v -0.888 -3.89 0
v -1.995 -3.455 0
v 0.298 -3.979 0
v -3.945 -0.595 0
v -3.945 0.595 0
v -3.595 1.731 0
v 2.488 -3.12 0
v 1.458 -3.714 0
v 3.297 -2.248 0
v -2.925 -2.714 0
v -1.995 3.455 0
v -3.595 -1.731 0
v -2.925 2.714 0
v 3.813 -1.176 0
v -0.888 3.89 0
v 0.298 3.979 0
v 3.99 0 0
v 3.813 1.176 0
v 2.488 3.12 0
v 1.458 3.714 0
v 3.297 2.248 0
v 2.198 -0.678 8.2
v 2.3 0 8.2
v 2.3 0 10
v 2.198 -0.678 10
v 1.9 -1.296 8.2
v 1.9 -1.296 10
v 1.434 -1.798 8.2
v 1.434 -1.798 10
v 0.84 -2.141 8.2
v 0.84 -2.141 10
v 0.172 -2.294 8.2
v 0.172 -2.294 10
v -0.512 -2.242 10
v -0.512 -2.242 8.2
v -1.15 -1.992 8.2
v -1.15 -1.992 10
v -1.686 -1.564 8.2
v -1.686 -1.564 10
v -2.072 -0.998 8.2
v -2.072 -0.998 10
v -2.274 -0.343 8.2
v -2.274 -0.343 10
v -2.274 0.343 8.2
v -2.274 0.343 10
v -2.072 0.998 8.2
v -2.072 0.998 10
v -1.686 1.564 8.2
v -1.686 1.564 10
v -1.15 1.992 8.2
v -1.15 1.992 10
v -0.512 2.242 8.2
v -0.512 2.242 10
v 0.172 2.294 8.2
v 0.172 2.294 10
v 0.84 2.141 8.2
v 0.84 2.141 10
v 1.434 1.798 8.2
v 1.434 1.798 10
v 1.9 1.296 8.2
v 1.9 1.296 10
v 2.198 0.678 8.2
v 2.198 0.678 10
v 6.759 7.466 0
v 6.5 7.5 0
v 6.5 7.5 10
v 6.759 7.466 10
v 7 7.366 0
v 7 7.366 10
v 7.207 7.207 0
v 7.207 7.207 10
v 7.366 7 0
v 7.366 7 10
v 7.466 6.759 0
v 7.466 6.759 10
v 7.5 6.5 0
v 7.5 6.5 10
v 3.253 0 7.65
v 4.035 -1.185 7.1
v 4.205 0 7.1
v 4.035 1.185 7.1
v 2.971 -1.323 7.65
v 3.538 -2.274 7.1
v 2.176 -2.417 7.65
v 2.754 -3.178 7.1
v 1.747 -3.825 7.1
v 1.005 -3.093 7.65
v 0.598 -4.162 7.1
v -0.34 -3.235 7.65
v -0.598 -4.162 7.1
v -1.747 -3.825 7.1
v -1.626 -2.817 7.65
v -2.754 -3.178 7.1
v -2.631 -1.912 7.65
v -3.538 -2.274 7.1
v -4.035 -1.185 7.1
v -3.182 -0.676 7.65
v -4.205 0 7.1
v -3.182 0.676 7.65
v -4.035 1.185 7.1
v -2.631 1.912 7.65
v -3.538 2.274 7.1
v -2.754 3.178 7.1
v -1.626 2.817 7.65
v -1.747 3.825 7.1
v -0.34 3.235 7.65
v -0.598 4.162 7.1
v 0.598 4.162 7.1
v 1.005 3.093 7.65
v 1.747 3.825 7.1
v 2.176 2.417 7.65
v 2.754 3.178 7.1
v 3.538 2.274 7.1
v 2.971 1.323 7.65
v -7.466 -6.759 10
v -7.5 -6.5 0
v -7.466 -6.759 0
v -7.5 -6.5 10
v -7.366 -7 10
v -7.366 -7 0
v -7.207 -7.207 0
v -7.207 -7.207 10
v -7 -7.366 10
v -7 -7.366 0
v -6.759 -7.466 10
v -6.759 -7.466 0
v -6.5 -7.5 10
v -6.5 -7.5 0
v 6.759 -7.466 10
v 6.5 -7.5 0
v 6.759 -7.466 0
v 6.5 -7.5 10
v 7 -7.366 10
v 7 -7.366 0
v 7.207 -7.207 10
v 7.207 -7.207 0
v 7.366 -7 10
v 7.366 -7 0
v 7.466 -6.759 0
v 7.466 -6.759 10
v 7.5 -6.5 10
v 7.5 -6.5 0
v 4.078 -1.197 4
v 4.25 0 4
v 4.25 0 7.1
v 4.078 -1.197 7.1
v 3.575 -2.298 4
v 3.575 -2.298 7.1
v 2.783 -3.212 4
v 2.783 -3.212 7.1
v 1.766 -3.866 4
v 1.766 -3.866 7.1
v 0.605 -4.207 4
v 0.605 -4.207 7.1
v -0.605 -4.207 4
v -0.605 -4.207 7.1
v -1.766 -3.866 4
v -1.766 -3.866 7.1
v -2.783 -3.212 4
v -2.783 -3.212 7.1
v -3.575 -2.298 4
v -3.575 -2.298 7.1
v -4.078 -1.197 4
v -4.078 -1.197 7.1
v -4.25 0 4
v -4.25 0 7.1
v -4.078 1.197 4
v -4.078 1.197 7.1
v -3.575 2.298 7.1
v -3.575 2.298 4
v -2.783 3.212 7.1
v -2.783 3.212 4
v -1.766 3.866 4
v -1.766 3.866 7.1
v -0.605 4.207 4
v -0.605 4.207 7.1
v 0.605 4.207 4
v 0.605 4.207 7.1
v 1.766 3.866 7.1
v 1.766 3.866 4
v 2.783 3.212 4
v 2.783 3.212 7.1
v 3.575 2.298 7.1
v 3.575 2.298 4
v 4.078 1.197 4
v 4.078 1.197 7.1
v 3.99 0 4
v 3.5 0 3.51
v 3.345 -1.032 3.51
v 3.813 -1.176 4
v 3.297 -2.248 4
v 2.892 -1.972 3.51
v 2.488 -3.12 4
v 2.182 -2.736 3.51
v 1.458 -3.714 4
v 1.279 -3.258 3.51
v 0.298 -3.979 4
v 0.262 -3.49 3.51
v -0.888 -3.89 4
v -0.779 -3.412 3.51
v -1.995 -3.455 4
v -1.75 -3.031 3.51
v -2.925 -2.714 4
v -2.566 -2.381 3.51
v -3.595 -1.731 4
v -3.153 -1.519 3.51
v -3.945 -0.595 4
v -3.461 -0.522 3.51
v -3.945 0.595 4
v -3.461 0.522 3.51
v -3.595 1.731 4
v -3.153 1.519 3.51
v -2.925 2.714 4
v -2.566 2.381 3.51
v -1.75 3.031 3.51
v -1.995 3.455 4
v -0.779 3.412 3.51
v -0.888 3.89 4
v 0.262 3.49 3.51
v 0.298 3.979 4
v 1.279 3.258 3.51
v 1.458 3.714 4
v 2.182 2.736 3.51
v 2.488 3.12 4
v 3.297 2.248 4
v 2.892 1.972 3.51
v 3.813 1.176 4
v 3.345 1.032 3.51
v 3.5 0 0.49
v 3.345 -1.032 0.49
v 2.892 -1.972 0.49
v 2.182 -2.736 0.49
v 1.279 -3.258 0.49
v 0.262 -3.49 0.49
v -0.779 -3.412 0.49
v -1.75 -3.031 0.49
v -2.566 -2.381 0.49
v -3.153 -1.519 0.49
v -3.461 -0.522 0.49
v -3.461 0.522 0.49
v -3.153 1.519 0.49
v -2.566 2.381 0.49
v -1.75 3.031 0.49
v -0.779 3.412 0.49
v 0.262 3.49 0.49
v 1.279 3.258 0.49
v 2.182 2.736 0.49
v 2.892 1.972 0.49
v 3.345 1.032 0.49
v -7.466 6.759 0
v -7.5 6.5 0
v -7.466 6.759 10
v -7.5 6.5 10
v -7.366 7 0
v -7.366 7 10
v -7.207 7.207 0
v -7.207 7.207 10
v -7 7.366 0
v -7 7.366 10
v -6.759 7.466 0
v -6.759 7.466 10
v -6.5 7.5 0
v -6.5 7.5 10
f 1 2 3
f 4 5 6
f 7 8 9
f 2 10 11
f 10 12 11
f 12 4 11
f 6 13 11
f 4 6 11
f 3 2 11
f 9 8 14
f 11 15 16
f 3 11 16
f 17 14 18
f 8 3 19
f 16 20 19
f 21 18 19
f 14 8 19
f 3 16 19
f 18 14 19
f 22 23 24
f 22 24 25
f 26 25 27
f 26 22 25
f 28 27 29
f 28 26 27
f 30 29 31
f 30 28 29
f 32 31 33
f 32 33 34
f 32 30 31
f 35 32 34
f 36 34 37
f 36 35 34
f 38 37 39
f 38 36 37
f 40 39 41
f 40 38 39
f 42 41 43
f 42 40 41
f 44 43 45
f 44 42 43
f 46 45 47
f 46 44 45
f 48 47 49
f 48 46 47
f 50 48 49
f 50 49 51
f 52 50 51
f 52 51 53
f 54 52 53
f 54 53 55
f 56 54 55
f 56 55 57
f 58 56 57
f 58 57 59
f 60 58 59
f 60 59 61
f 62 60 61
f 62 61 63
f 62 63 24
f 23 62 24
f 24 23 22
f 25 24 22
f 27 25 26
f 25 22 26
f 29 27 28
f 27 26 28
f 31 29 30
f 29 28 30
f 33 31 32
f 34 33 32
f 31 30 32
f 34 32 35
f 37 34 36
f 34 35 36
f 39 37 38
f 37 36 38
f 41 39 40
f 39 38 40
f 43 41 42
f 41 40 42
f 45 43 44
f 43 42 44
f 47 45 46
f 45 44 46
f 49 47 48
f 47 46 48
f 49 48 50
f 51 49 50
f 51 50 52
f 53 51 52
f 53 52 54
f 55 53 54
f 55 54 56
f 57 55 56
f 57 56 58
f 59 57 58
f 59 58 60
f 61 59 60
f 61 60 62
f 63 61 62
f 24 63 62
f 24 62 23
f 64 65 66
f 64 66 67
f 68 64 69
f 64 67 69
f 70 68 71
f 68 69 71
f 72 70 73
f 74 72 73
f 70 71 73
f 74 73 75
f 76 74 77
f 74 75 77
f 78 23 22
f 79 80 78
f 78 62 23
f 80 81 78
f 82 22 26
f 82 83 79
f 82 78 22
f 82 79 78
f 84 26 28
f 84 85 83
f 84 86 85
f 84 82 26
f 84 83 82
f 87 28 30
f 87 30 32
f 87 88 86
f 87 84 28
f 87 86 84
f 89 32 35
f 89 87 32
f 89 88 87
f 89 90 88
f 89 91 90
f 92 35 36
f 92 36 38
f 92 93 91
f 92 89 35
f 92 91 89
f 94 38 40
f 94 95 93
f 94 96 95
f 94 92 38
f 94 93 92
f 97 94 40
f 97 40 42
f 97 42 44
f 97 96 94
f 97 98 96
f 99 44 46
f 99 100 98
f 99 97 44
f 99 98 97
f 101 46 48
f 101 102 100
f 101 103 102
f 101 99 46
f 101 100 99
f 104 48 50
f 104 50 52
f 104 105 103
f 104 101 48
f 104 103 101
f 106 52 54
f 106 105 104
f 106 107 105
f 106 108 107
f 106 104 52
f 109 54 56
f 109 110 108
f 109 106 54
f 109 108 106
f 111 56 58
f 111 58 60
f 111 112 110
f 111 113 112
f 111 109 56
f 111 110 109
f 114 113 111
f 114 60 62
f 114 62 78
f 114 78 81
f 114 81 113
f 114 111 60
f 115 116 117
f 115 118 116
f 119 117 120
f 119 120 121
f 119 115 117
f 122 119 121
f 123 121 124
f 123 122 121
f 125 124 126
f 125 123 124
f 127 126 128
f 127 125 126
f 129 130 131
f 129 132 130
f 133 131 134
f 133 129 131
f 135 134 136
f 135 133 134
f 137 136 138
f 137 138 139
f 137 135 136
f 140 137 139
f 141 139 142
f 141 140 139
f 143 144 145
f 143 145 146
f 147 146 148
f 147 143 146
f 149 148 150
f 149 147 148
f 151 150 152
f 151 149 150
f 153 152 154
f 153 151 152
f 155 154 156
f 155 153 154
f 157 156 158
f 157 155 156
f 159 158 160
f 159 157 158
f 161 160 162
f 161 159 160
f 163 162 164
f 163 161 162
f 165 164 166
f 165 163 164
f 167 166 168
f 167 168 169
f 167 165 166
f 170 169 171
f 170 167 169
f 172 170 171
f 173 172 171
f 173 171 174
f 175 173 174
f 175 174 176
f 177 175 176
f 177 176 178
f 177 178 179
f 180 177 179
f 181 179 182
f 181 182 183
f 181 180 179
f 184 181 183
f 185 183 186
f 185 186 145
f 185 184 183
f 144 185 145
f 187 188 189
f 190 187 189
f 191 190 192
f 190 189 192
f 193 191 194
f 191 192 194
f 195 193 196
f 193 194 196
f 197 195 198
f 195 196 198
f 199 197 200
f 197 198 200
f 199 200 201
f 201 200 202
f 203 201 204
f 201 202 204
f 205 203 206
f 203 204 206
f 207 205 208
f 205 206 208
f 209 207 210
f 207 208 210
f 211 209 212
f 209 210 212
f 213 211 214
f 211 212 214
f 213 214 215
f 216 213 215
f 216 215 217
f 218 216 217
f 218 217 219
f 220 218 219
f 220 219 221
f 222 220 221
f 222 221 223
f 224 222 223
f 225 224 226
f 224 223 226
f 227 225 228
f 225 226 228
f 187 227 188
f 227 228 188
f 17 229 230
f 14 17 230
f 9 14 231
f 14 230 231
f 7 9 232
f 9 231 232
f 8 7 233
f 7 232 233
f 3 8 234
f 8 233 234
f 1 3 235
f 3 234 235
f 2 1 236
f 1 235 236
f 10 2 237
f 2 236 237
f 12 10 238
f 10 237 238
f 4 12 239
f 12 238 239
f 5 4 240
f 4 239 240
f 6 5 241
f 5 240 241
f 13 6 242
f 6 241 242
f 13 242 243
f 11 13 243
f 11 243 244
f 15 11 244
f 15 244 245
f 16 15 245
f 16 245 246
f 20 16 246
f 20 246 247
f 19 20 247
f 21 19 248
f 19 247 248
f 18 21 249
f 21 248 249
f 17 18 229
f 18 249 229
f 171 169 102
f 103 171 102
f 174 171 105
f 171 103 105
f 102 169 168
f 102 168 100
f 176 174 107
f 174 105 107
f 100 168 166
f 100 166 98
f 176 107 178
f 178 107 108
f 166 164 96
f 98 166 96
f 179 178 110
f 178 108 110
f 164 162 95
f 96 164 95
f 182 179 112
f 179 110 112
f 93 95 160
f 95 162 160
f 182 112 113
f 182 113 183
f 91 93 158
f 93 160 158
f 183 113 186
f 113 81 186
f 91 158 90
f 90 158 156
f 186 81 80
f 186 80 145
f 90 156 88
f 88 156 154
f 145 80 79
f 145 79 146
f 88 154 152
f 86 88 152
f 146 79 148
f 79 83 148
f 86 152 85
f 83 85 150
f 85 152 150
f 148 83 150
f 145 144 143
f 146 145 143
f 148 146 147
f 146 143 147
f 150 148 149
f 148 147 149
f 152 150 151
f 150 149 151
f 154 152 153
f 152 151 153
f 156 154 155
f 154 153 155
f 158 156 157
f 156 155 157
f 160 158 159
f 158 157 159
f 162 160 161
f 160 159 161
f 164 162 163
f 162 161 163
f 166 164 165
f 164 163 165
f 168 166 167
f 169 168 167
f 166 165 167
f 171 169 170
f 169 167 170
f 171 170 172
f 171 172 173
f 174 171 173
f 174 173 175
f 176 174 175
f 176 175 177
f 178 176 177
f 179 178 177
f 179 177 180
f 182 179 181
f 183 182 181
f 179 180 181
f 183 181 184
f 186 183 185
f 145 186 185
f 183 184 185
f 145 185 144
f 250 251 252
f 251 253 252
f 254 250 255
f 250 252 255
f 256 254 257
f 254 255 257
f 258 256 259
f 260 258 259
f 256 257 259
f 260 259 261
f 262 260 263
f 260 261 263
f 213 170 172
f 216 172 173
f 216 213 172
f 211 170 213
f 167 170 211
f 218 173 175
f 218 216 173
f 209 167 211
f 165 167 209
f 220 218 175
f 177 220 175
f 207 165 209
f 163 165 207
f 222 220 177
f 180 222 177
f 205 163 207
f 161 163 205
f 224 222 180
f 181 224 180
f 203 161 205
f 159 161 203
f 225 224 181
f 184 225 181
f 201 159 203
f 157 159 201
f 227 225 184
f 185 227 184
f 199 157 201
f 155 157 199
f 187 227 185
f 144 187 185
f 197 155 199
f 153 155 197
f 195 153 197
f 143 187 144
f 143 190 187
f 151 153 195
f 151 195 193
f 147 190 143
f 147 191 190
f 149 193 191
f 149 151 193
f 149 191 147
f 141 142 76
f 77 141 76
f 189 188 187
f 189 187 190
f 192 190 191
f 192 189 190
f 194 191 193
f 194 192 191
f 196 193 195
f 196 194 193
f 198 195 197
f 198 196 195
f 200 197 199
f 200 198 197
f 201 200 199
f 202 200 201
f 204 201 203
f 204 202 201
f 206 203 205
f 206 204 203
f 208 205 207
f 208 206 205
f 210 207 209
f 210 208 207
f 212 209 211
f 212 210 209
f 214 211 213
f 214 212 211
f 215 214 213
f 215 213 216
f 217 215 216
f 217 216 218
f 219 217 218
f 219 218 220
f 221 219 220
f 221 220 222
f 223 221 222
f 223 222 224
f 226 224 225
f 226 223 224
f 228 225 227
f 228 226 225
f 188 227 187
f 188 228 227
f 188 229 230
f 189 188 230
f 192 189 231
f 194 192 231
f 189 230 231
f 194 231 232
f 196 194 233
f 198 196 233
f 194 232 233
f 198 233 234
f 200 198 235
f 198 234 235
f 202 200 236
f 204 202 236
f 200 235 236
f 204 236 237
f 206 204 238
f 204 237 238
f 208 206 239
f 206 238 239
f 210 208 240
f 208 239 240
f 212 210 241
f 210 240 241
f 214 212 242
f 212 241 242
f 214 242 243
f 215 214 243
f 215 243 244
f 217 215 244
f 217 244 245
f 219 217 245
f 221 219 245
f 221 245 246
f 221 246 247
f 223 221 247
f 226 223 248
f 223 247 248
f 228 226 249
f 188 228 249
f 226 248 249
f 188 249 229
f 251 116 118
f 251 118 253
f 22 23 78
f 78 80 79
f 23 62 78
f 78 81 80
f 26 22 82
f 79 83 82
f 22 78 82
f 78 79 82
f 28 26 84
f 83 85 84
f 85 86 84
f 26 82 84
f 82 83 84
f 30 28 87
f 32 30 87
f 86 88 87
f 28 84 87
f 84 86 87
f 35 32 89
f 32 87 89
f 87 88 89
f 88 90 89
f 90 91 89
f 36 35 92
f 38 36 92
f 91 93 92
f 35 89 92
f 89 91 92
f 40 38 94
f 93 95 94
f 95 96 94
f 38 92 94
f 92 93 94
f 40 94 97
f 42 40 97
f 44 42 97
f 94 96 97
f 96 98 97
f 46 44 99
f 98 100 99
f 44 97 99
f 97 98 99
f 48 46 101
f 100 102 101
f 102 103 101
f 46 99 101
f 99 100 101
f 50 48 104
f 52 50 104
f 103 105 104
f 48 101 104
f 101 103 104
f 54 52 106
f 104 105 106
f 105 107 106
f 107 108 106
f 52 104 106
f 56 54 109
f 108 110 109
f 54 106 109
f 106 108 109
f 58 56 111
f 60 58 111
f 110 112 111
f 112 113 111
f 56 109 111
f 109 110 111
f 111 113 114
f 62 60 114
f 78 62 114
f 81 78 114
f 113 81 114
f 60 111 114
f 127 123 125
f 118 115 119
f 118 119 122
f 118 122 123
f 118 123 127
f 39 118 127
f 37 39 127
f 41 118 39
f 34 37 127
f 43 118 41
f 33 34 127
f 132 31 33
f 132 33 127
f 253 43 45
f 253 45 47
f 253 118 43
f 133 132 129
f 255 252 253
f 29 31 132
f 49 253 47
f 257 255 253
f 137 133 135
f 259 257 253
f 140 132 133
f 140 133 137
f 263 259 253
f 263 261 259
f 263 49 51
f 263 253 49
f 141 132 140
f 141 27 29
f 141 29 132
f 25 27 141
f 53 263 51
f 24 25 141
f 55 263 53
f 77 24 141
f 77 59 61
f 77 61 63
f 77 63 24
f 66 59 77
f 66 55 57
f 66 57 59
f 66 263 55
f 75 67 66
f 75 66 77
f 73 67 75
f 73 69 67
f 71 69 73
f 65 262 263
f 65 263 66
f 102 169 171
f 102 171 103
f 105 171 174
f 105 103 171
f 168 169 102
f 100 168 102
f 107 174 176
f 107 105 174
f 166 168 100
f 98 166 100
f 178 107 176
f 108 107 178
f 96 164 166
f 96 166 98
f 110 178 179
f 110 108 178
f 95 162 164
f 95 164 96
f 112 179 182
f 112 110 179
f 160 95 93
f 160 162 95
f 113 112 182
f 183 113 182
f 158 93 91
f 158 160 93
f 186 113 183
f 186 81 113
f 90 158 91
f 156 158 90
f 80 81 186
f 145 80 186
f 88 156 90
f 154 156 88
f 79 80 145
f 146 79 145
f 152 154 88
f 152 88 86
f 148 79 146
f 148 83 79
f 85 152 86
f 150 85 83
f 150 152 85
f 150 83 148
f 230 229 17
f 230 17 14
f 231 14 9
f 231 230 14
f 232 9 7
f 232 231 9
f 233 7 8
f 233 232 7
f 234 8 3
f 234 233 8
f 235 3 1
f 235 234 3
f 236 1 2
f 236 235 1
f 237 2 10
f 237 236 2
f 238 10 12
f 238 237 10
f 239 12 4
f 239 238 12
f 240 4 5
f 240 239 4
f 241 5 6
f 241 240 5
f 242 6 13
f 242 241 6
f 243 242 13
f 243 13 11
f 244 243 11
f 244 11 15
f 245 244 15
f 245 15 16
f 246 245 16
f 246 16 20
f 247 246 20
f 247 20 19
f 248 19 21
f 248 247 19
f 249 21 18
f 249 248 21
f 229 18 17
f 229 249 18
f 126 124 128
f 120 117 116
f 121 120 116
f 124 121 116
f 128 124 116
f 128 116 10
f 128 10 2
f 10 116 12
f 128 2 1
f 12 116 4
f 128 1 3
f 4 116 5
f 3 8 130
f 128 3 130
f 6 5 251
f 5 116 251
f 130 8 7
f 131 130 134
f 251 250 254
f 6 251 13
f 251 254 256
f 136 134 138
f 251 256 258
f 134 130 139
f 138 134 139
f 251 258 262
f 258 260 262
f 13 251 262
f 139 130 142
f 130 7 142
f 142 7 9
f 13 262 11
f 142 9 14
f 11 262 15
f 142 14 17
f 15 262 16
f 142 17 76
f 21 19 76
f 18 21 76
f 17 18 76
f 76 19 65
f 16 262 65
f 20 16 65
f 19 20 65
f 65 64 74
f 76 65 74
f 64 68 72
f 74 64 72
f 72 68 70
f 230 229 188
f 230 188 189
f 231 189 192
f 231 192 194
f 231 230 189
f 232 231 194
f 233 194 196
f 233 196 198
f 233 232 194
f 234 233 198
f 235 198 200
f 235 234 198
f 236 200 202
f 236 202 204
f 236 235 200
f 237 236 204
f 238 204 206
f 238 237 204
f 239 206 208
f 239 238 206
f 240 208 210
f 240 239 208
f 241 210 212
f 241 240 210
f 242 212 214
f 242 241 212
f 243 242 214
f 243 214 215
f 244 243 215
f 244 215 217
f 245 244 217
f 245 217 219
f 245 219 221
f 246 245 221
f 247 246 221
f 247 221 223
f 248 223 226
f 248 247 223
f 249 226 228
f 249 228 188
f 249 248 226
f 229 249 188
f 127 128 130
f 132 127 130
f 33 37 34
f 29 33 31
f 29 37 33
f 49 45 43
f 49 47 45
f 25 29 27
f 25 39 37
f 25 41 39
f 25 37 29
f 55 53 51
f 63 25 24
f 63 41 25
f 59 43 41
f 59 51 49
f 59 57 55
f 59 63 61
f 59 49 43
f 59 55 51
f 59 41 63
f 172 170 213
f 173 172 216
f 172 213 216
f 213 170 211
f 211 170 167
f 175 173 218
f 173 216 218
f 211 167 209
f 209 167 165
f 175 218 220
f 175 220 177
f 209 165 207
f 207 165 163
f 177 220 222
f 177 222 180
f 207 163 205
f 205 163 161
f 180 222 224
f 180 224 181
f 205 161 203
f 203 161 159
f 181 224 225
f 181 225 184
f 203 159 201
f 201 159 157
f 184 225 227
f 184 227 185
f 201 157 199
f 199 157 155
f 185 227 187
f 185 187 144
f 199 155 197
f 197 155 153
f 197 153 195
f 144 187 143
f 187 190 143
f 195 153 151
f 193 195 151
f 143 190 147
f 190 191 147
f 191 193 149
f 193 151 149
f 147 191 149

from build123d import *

# Parameters (mm, degrees)
SKETCH_W        = 15
SKETCH_H        = 15
PAD_DEPTH       = 10
SKETCH001_R     = 3.5
POCKET_DEPTH    = 4
SKETCH002_R     = 4.25
POCKET001_DEPTH = 3.1
SKETCH003_R     = 2.3
POCKET002_DEPTH = 2.901
CHAMFER_ANGLE   = 60
CHAMFER_SIZE    = 1.1
CHAMFER001_SIZE = 0.49
FILLET_R        = 1
SKETCH004_R     = 7.012338
PAD001_DEPTH    = 10


with BuildPart() as socket:
    # Sketch → Pad (new body)
    with BuildSketch(Plane.XY):
        Rectangle(SKETCH_W, SKETCH_H)
    extrude(amount=PAD_DEPTH)

    # Sketch001 (on Face5 of Pad) → Pocket (cut)
    with BuildSketch(Plane(origin=(0, 0, 0), x_dir=(1, 0, 0), z_dir=(0, 0, -1))):
        Circle(SKETCH001_R)
    extrude(amount=-POCKET_DEPTH, mode=Mode.SUBTRACT)

    # Sketch002 (on Face8 of Pocket) → Pocket001 (cut)
    with BuildSketch(Plane(origin=(0, 0, 4), x_dir=(1, 0, 0), z_dir=(0, 0, -1))):
        Circle(SKETCH002_R)
    extrude(amount=-POCKET001_DEPTH, mode=Mode.SUBTRACT)

    # Sketch003 (on Face10 of Pocket001) → Pocket002 (cut, through all)
    with BuildSketch(Plane(origin=(0, 0, 7.1), x_dir=(1, 0, 0), z_dir=(0, 0, -1))):
        Circle(SKETCH003_R)
    extrude(amount=-POCKET002_DEPTH, mode=Mode.SUBTRACT)

    # Chamfer
    chamfer_edges = [socket.edges().sort_by_distance(p)[0] for p in [
        (-2.3, 0, 7.1),
    ]]
    chamfer_side = socket.faces().sort_by_distance((-2.3, 0, 8.55))[0]
    chamfer(chamfer_edges, length=CHAMFER_SIZE, angle=CHAMFER_ANGLE, reference=chamfer_side)

    # Chamfer001
    chamfer001_edges = [socket.edges().sort_by_distance(p)[0] for p in [
        (-3.5, 0, 4),
        (-3.5, 0, 0),
    ]]
    chamfer(chamfer001_edges, length=CHAMFER001_SIZE)

    # Fillet
    fillet_edges = [socket.edges().sort_by_distance(p)[0] for p in [
        (-7.5, -7.5, 5),
        (-7.5, 7.5, 5),
        (7.5, -7.5, 5),
        (7.5, 7.5, 5),
    ]]
    fillet(fillet_edges, radius=FILLET_R)


with BuildPart() as socket001:
    # Link base: copy of socket
    add(socket.part)


with BuildPart() as socket_cut:
    # Sketch004 → Pad001 (new body)
    with BuildSketch(Plane.XY):
        Circle(SKETCH004_R)
    extrude(amount=PAD001_DEPTH)

    # Cut: cut socket001
    add(socket001.part, mode=Mode.SUBTRACT)


solid = Compound([socket.part, socket_cut.part])
